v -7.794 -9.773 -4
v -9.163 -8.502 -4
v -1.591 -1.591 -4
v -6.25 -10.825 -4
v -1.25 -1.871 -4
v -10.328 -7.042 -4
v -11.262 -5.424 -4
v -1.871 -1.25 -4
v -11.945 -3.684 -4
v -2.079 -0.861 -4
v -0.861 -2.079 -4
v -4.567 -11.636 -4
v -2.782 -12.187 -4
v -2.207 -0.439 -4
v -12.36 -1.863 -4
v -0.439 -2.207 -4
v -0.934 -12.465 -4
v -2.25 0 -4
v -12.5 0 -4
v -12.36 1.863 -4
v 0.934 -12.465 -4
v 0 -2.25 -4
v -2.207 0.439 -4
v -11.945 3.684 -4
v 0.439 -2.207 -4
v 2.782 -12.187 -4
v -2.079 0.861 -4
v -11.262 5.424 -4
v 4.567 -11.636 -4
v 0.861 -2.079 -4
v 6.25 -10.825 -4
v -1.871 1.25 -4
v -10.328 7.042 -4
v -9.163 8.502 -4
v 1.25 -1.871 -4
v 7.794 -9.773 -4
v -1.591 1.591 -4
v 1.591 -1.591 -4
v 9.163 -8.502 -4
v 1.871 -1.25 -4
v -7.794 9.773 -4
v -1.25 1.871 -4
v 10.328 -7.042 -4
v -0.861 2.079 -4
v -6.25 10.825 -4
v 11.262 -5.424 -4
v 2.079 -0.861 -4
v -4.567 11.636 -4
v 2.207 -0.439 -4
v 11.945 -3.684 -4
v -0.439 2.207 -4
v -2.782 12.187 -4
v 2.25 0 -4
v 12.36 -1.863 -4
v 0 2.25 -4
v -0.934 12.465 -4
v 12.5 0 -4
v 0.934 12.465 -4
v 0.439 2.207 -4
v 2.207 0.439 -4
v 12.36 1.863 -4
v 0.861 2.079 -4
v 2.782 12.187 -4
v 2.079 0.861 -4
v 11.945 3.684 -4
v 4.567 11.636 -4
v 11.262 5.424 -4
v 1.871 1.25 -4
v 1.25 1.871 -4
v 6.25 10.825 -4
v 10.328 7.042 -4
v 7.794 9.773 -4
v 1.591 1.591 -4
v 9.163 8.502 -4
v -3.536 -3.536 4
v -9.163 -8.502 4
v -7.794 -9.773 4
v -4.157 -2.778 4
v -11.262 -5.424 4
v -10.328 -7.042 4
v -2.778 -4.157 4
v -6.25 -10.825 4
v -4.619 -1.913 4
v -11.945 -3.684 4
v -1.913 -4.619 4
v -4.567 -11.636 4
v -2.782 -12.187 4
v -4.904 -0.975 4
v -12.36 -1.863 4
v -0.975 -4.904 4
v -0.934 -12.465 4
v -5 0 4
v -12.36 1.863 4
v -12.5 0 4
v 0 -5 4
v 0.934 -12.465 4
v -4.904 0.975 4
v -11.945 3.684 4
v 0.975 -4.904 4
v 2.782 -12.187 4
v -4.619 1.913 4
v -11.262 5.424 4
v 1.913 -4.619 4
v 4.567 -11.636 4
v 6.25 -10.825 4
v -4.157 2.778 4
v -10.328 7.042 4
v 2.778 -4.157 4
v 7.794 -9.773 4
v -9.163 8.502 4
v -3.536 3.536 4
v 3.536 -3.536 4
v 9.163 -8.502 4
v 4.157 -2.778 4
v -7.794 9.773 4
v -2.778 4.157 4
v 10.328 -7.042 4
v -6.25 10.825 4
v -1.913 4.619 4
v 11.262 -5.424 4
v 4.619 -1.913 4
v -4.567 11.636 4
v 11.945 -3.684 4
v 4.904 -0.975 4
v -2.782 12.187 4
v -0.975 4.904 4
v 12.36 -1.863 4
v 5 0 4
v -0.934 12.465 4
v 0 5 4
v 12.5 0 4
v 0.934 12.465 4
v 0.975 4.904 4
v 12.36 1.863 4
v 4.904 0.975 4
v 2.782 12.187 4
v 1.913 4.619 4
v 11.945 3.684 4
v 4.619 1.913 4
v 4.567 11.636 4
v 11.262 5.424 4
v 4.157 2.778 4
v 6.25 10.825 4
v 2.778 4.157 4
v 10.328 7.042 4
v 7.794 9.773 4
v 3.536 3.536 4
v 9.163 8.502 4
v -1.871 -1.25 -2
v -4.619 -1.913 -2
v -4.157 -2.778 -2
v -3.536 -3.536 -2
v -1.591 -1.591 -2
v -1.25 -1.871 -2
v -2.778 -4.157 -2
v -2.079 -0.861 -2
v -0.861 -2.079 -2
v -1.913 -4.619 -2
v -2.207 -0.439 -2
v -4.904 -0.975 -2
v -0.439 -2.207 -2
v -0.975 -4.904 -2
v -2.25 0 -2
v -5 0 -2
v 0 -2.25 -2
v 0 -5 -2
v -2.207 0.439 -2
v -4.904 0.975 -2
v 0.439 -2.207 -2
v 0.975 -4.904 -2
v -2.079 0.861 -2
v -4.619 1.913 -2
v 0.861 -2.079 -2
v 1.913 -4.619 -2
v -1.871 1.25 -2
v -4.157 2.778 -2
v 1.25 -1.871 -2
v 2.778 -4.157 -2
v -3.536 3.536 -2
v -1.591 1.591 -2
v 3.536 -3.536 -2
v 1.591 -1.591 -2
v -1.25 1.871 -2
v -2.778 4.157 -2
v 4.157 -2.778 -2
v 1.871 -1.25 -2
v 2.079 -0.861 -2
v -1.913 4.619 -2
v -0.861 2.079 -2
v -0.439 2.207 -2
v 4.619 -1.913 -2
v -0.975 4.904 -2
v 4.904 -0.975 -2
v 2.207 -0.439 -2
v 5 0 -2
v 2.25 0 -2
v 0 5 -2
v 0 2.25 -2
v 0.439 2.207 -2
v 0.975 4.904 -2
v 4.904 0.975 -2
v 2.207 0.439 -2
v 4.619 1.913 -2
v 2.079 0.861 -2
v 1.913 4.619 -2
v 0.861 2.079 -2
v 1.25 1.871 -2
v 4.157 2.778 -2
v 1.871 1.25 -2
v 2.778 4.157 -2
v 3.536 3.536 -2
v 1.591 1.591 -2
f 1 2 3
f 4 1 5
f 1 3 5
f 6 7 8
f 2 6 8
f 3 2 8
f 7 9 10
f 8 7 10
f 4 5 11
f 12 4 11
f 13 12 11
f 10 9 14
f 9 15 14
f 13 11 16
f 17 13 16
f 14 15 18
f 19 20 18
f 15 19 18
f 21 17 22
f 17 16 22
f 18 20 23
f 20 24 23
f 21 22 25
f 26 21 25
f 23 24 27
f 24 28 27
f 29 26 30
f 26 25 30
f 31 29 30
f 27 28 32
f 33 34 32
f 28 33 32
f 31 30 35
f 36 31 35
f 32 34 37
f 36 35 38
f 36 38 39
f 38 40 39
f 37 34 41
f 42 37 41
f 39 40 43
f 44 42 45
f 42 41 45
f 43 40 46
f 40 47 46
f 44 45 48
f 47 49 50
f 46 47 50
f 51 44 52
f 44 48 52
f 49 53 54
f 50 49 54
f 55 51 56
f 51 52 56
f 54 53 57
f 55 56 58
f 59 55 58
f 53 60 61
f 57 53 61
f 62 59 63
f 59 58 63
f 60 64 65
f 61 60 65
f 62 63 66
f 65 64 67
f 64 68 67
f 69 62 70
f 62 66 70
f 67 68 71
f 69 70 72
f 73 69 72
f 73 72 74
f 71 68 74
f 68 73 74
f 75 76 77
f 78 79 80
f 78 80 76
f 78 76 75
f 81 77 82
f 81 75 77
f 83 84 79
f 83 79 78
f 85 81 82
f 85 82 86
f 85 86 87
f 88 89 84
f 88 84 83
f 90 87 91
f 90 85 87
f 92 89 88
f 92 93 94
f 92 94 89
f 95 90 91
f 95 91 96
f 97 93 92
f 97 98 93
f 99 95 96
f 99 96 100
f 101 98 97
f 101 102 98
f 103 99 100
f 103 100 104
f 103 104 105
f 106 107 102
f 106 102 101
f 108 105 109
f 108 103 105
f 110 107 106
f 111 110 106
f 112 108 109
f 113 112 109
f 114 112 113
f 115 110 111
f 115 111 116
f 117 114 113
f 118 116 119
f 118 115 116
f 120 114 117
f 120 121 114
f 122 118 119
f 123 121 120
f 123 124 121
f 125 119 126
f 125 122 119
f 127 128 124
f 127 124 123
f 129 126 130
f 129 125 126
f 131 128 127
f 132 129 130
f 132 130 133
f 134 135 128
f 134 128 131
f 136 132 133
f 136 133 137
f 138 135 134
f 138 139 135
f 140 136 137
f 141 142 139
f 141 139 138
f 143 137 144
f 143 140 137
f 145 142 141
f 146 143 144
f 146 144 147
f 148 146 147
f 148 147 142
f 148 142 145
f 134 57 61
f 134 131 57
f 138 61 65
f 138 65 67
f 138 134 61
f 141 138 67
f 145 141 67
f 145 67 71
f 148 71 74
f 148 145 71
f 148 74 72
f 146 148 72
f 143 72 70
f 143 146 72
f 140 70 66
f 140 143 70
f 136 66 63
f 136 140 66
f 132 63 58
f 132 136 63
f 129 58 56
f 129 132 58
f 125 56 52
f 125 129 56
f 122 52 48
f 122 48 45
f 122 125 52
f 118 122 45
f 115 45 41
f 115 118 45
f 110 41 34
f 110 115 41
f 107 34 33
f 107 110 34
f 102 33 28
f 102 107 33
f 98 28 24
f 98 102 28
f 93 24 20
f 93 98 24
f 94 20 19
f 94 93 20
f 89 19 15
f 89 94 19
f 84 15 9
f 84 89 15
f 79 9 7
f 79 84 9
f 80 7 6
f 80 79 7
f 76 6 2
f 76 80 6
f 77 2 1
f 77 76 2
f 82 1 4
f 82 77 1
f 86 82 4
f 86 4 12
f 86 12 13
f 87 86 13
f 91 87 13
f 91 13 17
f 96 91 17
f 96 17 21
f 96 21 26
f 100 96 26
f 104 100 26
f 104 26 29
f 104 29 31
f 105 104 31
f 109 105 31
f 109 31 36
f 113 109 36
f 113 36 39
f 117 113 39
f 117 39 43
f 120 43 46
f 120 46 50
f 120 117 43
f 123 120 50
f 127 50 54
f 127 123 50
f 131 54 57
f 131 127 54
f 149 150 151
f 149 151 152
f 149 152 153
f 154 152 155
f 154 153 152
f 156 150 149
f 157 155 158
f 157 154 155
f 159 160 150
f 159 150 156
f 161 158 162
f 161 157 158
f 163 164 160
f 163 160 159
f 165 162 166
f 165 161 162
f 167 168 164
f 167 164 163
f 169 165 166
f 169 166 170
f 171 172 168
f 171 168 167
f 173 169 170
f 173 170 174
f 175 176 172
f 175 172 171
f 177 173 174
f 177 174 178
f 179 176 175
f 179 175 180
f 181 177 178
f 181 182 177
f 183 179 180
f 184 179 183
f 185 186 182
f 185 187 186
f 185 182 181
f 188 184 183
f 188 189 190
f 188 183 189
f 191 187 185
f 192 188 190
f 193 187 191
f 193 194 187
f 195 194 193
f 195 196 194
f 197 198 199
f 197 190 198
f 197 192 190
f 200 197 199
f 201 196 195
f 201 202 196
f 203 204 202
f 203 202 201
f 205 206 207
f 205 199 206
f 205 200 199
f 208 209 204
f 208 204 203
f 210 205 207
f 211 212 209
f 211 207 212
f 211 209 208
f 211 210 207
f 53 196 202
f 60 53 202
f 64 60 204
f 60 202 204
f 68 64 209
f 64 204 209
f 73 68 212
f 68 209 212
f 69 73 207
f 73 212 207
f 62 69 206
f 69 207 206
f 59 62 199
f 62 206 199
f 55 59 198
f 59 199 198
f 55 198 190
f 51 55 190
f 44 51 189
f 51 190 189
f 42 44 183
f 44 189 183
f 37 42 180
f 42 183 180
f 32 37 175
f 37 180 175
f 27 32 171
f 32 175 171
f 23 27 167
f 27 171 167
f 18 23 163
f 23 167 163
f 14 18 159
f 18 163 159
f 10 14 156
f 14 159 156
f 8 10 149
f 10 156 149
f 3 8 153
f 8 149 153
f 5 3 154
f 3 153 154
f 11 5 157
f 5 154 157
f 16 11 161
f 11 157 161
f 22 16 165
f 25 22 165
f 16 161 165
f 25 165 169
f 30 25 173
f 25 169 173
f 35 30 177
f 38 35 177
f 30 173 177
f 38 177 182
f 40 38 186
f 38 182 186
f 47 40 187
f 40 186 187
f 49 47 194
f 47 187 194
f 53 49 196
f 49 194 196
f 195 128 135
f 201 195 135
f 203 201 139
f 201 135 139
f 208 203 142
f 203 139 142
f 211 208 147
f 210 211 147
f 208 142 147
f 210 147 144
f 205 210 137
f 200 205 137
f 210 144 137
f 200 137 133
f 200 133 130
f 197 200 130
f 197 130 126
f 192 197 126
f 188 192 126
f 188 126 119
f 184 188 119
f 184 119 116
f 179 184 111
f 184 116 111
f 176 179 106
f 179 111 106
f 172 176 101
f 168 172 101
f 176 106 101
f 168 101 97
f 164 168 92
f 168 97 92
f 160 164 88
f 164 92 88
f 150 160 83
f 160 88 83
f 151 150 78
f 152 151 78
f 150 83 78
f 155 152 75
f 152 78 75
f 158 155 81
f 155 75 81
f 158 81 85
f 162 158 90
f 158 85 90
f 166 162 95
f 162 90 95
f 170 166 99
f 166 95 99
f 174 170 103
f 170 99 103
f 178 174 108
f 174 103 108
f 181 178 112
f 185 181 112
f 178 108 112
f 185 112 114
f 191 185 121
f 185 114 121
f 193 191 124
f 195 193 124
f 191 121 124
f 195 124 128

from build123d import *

# Parameters (mm, degrees)
SKETCH1_R           = 12.5
BOSS_EXTRUDE1_DEPTH = 4
SKETCH2_R           = 5
CUT_EXTRUDE1_DEPTH  = 6
SKETCH3_R           = 2.25
CUT_EXTRUDE2_DEPTH  = 2


with BuildPart() as part:
    # Sketch1 → Boss-Extrude1 (new, symmetric)
    with BuildSketch(Plane.XY):
        Circle(SKETCH1_R)
    extrude(amount=BOSS_EXTRUDE1_DEPTH, both=True)

    # Sketch2 → Cut-Extrude1 (cut)
    with BuildSketch(Plane.XY.offset(4)):
        Circle(SKETCH2_R)
    extrude(amount=-CUT_EXTRUDE1_DEPTH, mode=Mode.SUBTRACT)

    # Sketch3 → Cut-Extrude2 (cut)
    with BuildSketch(Plane.XY.offset(-2)):
        Circle(SKETCH3_R)
    extrude(amount=-CUT_EXTRUDE2_DEPTH, mode=Mode.SUBTRACT)


solid = part.part
